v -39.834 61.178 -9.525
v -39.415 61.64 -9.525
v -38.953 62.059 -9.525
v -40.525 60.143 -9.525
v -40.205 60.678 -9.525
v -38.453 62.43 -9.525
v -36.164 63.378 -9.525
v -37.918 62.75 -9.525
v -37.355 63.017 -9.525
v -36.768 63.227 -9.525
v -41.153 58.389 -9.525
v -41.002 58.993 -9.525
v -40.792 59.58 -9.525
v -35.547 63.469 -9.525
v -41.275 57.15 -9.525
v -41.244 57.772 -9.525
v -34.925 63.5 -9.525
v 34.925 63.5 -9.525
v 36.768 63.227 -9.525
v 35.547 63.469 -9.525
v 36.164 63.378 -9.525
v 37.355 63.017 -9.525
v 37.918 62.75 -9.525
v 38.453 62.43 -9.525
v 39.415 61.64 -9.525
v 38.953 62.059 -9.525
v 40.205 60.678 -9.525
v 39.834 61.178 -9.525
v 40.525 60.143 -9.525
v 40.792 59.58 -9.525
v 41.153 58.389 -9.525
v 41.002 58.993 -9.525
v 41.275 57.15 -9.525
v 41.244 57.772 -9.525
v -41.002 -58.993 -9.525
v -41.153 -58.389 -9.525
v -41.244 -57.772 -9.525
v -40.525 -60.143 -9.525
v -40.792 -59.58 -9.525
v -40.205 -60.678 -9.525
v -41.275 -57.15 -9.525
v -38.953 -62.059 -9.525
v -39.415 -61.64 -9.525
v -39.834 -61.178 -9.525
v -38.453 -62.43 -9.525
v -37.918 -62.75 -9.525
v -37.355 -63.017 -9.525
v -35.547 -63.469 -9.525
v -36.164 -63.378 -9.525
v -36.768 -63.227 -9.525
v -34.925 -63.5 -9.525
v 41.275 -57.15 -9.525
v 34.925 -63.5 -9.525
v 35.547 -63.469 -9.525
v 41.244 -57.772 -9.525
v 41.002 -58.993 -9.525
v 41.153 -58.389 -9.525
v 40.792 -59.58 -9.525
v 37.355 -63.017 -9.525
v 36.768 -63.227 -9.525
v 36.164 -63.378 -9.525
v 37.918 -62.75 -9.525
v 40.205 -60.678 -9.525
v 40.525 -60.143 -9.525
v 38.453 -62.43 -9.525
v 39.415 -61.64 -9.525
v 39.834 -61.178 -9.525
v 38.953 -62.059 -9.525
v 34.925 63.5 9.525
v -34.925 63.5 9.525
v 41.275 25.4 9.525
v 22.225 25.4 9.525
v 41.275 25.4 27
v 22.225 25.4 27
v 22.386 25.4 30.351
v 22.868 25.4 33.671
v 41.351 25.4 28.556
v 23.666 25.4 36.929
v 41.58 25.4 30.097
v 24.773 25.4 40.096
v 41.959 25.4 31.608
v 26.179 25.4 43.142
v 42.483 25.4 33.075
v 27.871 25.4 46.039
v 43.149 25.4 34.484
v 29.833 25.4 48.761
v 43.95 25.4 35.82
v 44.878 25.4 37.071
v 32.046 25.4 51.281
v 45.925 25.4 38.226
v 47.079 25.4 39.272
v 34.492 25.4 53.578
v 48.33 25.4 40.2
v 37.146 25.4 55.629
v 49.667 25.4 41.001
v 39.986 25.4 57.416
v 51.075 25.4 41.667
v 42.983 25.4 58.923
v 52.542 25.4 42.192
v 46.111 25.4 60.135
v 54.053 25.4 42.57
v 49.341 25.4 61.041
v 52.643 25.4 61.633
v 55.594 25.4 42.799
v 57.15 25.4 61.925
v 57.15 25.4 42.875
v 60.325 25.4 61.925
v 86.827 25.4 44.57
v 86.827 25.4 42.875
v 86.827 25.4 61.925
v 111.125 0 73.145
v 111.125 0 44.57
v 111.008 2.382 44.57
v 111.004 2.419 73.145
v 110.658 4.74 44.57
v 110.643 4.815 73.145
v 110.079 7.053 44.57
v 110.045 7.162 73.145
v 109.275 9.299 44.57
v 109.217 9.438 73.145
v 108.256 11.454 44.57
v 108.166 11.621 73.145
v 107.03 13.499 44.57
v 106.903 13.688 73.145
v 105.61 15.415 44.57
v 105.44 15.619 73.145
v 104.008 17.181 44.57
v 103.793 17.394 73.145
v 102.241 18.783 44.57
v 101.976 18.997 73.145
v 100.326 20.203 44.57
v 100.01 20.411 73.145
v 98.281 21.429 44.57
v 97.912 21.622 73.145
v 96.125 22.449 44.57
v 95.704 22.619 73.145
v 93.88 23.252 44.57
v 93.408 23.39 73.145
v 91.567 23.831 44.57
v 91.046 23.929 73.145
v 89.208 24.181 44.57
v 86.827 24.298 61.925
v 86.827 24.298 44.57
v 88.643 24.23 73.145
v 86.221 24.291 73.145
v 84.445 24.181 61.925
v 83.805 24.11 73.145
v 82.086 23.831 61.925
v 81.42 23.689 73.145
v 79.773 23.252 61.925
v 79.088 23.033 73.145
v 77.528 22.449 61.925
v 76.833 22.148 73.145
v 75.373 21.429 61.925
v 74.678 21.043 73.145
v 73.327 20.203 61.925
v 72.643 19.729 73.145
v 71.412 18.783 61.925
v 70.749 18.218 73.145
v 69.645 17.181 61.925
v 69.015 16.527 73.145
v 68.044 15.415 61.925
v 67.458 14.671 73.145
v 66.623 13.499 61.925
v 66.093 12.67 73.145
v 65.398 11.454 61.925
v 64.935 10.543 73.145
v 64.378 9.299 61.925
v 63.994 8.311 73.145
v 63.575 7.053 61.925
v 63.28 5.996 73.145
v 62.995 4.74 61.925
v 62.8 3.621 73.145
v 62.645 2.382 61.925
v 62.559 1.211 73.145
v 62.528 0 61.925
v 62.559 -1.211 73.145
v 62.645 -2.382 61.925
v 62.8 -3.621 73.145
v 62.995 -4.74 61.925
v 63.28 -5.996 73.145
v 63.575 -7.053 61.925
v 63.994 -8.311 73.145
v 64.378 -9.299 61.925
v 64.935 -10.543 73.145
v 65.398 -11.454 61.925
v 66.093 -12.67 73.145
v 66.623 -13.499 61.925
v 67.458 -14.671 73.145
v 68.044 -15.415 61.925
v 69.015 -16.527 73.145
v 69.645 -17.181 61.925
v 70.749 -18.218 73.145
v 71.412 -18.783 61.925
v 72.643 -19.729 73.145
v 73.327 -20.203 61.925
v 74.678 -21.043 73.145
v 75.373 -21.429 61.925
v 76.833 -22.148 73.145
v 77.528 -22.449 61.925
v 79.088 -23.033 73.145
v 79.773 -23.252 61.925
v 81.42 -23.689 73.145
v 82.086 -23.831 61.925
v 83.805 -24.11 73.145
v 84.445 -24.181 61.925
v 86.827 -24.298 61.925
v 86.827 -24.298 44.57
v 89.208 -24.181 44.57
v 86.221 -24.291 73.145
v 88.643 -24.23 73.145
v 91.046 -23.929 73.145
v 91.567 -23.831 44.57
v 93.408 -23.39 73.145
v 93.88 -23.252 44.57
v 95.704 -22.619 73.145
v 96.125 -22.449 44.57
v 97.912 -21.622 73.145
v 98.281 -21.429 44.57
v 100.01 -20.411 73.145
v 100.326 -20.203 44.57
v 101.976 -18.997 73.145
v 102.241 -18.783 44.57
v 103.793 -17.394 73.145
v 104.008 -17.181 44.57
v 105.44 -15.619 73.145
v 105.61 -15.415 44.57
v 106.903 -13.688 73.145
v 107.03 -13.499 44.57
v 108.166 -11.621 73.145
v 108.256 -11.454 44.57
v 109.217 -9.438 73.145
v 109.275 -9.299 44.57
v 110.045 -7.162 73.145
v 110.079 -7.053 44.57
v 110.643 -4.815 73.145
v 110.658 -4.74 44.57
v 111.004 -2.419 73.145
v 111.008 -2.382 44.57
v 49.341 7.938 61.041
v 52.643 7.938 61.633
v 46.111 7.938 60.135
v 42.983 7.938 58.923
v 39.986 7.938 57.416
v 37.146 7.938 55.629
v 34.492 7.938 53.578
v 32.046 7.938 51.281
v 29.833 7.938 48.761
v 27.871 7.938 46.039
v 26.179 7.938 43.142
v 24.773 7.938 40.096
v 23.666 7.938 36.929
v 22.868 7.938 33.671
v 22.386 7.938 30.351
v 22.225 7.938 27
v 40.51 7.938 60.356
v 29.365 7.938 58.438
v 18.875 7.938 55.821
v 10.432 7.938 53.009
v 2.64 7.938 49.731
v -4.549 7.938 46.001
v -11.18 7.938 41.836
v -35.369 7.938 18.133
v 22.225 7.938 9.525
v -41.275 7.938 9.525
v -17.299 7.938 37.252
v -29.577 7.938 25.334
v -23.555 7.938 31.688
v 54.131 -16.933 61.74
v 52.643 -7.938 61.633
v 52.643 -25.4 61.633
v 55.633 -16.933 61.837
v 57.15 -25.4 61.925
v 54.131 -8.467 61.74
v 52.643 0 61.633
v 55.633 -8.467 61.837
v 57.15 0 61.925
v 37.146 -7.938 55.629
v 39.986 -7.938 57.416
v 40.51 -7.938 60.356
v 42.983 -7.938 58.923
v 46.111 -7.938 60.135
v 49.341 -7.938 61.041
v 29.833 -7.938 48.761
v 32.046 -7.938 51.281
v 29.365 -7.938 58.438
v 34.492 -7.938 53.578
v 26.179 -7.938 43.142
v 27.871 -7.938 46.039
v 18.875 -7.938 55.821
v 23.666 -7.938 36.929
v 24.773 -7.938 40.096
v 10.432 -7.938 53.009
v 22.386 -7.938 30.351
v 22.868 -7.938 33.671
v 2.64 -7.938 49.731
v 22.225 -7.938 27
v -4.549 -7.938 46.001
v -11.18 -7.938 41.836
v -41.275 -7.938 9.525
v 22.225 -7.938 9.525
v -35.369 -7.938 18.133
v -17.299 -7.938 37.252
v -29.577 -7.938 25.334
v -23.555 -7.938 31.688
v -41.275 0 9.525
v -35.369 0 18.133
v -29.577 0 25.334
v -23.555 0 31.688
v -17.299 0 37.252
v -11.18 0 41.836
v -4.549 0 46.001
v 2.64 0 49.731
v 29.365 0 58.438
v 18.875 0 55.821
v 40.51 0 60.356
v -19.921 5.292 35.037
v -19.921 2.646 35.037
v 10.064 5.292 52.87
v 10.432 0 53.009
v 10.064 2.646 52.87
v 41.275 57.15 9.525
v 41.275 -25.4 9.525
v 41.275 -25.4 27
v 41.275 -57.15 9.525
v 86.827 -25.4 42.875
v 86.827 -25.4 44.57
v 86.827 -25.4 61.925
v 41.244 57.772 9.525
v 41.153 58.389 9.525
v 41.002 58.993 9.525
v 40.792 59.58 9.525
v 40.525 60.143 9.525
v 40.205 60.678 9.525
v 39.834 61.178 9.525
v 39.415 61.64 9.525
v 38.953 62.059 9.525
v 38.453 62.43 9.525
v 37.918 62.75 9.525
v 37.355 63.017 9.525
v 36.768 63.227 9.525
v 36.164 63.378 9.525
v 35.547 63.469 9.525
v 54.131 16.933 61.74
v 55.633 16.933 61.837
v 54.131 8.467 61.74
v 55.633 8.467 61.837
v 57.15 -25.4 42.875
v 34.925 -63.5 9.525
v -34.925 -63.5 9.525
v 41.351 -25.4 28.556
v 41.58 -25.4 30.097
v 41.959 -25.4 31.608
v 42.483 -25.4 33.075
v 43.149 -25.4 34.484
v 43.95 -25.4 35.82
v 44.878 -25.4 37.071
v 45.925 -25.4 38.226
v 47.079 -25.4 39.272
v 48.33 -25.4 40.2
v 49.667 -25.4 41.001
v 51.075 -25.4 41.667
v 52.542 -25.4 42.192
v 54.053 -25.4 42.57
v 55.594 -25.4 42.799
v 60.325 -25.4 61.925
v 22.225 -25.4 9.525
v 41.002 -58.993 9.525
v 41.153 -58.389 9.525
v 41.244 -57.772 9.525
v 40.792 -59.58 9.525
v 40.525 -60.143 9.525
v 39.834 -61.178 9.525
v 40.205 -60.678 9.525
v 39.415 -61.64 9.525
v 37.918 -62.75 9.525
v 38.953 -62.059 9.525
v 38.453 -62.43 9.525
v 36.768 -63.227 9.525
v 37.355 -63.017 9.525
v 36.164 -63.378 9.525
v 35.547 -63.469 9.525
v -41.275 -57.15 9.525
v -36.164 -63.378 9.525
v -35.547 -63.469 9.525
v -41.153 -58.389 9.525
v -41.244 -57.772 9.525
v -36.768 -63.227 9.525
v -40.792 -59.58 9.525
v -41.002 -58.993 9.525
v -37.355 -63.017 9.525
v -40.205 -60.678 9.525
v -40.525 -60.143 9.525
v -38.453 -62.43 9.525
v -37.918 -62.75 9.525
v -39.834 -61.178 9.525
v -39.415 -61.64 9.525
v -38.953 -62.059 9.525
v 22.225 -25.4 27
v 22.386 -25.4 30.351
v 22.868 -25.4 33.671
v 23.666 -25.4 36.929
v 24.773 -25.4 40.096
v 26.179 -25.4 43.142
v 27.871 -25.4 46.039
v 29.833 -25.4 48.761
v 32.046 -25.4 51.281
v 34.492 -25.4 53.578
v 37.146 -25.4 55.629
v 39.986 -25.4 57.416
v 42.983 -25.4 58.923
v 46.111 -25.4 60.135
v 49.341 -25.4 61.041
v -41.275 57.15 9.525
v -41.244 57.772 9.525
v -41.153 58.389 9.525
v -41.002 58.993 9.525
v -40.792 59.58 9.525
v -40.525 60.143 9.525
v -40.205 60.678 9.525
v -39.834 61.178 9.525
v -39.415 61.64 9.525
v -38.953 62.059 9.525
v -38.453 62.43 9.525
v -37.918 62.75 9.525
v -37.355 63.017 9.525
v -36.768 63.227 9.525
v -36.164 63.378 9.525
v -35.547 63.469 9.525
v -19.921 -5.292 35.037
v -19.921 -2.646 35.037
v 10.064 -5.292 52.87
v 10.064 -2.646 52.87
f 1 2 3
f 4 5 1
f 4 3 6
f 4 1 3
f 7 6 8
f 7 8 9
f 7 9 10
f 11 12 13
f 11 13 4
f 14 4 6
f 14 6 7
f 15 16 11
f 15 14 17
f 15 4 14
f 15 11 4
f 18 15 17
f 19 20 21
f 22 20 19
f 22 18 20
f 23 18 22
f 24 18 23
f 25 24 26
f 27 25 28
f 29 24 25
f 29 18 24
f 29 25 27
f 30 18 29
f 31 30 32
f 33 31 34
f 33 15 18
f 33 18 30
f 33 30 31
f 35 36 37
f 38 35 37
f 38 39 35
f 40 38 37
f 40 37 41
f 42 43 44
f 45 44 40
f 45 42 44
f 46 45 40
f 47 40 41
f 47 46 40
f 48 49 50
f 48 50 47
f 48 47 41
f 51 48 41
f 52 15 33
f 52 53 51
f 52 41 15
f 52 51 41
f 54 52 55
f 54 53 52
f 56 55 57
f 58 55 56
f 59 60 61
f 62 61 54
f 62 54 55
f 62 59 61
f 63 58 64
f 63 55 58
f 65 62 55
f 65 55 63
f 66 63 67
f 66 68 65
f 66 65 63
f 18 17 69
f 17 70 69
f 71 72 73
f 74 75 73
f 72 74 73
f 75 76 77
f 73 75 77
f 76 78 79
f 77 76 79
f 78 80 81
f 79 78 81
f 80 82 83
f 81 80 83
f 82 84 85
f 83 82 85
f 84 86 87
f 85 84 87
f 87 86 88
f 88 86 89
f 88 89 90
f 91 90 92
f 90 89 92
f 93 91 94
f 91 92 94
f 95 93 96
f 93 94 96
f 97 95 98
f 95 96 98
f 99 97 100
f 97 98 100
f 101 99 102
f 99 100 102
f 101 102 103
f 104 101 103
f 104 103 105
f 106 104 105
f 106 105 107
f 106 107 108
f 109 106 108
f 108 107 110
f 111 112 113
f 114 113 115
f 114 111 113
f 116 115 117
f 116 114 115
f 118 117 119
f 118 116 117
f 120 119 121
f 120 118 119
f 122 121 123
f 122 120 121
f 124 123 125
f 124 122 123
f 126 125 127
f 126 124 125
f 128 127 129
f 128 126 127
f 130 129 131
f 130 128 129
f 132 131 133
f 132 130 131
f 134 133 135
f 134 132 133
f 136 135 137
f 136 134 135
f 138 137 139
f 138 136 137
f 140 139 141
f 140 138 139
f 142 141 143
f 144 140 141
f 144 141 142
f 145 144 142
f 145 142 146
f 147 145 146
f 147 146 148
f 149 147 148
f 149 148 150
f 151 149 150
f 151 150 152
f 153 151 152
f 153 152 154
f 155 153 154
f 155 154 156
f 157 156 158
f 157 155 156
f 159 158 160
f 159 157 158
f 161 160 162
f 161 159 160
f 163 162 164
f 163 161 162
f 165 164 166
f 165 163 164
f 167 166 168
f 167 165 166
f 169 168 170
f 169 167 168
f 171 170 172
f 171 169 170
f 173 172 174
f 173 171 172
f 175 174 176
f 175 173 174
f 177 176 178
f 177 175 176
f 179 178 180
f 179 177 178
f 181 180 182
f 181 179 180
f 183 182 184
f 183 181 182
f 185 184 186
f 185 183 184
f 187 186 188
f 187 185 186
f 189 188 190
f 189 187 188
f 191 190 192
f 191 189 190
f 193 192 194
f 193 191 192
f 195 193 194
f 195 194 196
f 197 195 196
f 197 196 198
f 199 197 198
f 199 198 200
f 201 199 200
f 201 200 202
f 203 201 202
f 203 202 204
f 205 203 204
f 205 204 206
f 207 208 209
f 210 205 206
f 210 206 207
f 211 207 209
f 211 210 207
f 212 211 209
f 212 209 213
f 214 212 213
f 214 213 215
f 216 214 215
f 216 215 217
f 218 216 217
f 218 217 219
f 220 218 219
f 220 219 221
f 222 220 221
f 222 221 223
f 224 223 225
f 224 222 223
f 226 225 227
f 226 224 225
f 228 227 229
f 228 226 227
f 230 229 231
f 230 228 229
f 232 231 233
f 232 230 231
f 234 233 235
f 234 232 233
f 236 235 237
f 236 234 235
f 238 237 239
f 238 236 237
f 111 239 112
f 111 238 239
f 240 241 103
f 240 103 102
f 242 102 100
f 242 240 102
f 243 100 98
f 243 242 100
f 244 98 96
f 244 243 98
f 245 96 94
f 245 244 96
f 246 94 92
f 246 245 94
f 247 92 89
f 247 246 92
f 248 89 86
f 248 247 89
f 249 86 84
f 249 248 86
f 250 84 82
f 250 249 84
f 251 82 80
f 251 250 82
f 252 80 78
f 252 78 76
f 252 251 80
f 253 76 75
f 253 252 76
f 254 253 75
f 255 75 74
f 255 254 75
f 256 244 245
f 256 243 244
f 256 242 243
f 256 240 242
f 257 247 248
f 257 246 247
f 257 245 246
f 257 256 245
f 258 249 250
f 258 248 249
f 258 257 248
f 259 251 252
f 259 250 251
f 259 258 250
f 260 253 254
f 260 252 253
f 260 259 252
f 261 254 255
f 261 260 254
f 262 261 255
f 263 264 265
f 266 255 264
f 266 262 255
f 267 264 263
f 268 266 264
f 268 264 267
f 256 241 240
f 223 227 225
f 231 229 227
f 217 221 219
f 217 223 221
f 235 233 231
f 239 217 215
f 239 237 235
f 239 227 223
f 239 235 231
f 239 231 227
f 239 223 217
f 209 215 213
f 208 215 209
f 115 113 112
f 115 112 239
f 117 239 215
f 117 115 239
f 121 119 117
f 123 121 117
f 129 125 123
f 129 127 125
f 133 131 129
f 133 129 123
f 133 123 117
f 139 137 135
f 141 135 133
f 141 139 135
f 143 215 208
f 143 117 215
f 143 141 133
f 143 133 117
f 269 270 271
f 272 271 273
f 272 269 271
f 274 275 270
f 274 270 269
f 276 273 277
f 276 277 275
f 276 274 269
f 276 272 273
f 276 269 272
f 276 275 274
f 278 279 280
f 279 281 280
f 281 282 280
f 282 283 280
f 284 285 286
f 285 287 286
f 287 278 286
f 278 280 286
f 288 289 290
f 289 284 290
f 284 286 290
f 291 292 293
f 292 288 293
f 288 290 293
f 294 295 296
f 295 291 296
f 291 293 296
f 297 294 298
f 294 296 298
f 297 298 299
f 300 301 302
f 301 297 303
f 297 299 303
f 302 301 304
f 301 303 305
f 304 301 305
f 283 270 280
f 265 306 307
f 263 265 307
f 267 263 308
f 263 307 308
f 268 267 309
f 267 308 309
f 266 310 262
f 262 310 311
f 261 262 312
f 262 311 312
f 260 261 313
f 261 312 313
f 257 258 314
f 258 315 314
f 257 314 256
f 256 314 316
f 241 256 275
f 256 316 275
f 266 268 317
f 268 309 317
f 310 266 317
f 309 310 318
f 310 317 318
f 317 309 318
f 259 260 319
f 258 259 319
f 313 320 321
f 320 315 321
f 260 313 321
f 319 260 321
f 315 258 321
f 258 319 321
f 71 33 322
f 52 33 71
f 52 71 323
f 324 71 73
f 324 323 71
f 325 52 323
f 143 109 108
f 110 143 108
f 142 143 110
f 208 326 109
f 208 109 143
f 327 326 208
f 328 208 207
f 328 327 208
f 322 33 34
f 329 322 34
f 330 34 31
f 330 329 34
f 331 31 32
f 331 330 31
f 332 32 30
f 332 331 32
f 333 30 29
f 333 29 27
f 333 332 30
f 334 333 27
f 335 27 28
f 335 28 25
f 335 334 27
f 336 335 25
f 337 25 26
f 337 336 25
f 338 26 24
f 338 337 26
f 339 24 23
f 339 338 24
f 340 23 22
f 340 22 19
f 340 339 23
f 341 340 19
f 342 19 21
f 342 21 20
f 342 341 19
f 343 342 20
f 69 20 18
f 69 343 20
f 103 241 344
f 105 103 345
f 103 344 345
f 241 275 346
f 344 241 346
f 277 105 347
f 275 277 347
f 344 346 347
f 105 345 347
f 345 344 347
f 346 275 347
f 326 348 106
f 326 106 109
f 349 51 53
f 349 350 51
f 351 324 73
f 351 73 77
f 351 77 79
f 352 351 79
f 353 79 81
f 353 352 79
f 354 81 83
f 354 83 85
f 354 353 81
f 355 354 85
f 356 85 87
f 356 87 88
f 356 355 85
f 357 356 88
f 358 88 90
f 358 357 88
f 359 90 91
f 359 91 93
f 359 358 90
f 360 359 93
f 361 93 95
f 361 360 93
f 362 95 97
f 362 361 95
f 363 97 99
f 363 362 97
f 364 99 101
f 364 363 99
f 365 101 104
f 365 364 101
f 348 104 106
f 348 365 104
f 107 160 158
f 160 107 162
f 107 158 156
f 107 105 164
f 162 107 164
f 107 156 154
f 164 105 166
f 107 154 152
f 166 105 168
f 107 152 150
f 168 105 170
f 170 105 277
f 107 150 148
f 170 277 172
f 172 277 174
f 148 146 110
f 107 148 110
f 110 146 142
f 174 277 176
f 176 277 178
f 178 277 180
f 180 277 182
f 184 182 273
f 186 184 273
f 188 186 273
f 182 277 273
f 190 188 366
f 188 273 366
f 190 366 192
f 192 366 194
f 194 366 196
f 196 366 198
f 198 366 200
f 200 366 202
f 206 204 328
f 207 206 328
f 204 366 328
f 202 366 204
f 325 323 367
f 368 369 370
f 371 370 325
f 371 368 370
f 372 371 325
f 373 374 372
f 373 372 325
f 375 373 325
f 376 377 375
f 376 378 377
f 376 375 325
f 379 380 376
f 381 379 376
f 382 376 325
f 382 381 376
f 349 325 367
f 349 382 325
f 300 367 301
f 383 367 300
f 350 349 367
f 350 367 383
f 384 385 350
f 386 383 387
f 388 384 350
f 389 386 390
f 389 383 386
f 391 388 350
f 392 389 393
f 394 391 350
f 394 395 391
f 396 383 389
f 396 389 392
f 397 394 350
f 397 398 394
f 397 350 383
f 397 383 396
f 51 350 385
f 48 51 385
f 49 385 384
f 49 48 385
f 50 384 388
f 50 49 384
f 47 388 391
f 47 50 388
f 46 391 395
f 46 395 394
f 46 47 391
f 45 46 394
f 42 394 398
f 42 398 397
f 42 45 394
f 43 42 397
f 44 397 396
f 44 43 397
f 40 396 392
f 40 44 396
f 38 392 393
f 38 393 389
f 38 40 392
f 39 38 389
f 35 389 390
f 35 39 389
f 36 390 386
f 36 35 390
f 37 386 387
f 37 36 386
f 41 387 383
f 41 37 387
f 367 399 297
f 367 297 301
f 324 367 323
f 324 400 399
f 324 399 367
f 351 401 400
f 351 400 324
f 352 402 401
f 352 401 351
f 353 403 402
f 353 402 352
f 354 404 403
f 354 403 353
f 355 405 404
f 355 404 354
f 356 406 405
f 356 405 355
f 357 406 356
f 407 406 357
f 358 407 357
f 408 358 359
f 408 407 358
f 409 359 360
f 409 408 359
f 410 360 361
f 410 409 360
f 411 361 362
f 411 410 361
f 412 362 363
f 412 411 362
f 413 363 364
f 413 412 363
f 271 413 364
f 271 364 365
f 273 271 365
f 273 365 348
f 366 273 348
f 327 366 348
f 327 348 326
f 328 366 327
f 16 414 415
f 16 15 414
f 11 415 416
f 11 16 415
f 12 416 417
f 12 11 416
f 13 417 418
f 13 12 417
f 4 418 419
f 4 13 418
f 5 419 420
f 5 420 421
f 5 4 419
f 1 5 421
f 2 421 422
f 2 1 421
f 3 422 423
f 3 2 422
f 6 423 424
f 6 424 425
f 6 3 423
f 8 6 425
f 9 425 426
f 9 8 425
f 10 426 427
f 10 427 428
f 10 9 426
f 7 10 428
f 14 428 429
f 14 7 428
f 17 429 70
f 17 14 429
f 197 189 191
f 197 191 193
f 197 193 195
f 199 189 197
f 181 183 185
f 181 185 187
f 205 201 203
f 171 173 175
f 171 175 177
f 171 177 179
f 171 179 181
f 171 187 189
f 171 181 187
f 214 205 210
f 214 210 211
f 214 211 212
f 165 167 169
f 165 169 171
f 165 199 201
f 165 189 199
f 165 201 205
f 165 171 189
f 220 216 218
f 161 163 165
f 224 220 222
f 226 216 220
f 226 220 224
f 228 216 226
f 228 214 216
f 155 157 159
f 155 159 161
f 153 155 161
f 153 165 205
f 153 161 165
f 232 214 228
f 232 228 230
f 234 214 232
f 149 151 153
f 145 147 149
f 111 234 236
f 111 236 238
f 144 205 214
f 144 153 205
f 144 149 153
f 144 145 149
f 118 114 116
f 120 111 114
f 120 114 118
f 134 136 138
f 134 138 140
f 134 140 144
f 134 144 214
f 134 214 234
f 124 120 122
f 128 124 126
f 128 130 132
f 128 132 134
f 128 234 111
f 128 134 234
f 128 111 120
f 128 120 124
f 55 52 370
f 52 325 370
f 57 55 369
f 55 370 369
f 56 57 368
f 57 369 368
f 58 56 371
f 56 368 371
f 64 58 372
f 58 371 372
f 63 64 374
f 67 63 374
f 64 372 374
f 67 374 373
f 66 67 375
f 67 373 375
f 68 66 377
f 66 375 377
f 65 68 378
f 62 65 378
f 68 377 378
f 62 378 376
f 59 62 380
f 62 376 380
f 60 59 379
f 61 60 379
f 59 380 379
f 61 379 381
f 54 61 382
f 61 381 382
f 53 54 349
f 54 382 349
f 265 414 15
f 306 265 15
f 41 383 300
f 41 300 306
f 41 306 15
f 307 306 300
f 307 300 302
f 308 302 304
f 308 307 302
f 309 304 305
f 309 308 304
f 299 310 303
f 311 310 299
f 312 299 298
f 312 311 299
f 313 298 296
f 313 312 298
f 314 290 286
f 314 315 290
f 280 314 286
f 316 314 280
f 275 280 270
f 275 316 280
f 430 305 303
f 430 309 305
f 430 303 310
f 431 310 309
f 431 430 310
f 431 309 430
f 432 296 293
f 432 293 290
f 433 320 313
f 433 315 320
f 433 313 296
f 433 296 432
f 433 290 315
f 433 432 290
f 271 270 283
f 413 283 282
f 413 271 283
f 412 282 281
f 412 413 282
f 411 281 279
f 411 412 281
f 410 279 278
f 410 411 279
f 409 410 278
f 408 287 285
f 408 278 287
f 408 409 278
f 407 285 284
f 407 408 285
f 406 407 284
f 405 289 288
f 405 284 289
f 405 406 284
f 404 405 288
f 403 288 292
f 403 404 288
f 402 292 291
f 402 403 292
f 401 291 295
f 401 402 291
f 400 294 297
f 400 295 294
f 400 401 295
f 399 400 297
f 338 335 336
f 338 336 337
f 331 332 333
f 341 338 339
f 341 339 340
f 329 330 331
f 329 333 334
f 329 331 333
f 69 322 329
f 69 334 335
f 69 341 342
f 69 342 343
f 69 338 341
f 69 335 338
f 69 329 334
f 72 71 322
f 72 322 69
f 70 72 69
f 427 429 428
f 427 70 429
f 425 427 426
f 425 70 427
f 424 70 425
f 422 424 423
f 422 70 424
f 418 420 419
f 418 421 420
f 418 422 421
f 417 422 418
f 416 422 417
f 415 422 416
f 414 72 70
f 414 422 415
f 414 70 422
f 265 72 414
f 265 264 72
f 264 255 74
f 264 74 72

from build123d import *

# Parameters (mm, degrees)
F1_DEPTH = 63.5
F0_W     = 26.5017113779
F0_H     = 17.3551412069
F2_DEPTH = 25.4
F3_DEPTH = 7.9375
F5_R     = 6.35


with BuildPart() as f1:
    # F0 (on Front) → F1 (new body, symmetric)
    with BuildSketch(Plane.XZ):
        Polygon((-41.275, -9.525), (41.275, -9.525), (41.275, 9.525), (22.225, 9.525), (-41.275, 9.525), align=None)
    extrude(amount=F1_DEPTH, both=True)

    # F0 (on Front) → F2 (join, symmetric)
    with BuildSketch(Plane.XZ):
        with BuildLine():
            Line((22.225, 9.525), (41.275, 9.525))
            Line((41.275, 9.525), (41.275, 27.0002))
            ThreePointArc((41.275, 27.0002), (45.9246798487, 38.2255201513), (57.15, 42.8752))
            Line((57.15, 42.8752), (86.8267113779, 42.8752))
            Line((86.8267113779, 42.8752), (86.8267113779, 44.5700587931))
            Line((86.8267113779, 44.5700587931), (60.325, 44.5700587931))
            Line((60.325, 44.5700587931), (60.325, 61.9252))
            Line((60.325, 61.9252), (57.15, 61.9252))
            add(Edge.make_bspline(
                [(52.6432559299, 61.6332027992), (54.1237485825, 61.7442374051), (55.6258441188, 61.8416233146), (57.15, 61.9252)],
                knots=[108.3100725279, 108.3100725279, 108.3100725279, 108.3100725279, 111.5045361635, 111.5045361635, 111.5045361635, 111.5045361635], degree=3))
            ThreePointArc((52.6432559299, 61.6332027992), (30.9092524721, 50.0475164203), (22.225, 27.0002))
            Line((22.225, 27.0002), (22.225, 9.525))
        make_face()
        with Locations((73.5758556889, 53.2476293965)):
            Rectangle(F0_W, F0_H)
    extrude(amount=F2_DEPTH, both=True)

    # F0 (on Front) → F3 (join, symmetric)
    with BuildSketch(Plane.XZ):
        with BuildLine():
            add(Edge.make_bspline(
                [(-41.275, 9.525), (-22.9162119867, 38.413460075), (2.4463262192, 57.8685125131), (52.6432559299, 61.6332027992)],
                knots=[0, 0, 0, 0, 108.3100725279, 108.3100725279, 108.3100725279, 108.3100725279], degree=3))
            Line((-41.275, 9.525), (22.225, 9.525))
            Line((22.225, 9.525), (22.225, 27.0002))
            ThreePointArc((22.225, 27.0002), (30.9092524721, 50.0475164203), (52.6432559299, 61.6332027992))
        make_face()
    extrude(amount=F3_DEPTH, both=True)

    # F0 (on Front) → F4 (revolve)
    with BuildSketch(Plane.XZ):
        Polygon((86.8267113779, 61.9252), (86.8267113779, 44.5700587931), (111.125, 44.5700587931), (111.125, 73.1450587931), (86.8267113779, 73.1450587931), align=None)
    revolve(axis=Axis((86.8267113779, 0, 58.0101293965), (0, 0, 1)))

    # F5
    f5_edges = [f1.edges().sort_by_distance(p)[0] for p in [
        (41.275, -63.5, 0),
        (-41.275, -63.5, 0),
        (41.275, 63.5, 0),
        (-41.275, 63.5, 0),
    ]]
    fillet(f5_edges, radius=F5_R)


solid = f1.part
